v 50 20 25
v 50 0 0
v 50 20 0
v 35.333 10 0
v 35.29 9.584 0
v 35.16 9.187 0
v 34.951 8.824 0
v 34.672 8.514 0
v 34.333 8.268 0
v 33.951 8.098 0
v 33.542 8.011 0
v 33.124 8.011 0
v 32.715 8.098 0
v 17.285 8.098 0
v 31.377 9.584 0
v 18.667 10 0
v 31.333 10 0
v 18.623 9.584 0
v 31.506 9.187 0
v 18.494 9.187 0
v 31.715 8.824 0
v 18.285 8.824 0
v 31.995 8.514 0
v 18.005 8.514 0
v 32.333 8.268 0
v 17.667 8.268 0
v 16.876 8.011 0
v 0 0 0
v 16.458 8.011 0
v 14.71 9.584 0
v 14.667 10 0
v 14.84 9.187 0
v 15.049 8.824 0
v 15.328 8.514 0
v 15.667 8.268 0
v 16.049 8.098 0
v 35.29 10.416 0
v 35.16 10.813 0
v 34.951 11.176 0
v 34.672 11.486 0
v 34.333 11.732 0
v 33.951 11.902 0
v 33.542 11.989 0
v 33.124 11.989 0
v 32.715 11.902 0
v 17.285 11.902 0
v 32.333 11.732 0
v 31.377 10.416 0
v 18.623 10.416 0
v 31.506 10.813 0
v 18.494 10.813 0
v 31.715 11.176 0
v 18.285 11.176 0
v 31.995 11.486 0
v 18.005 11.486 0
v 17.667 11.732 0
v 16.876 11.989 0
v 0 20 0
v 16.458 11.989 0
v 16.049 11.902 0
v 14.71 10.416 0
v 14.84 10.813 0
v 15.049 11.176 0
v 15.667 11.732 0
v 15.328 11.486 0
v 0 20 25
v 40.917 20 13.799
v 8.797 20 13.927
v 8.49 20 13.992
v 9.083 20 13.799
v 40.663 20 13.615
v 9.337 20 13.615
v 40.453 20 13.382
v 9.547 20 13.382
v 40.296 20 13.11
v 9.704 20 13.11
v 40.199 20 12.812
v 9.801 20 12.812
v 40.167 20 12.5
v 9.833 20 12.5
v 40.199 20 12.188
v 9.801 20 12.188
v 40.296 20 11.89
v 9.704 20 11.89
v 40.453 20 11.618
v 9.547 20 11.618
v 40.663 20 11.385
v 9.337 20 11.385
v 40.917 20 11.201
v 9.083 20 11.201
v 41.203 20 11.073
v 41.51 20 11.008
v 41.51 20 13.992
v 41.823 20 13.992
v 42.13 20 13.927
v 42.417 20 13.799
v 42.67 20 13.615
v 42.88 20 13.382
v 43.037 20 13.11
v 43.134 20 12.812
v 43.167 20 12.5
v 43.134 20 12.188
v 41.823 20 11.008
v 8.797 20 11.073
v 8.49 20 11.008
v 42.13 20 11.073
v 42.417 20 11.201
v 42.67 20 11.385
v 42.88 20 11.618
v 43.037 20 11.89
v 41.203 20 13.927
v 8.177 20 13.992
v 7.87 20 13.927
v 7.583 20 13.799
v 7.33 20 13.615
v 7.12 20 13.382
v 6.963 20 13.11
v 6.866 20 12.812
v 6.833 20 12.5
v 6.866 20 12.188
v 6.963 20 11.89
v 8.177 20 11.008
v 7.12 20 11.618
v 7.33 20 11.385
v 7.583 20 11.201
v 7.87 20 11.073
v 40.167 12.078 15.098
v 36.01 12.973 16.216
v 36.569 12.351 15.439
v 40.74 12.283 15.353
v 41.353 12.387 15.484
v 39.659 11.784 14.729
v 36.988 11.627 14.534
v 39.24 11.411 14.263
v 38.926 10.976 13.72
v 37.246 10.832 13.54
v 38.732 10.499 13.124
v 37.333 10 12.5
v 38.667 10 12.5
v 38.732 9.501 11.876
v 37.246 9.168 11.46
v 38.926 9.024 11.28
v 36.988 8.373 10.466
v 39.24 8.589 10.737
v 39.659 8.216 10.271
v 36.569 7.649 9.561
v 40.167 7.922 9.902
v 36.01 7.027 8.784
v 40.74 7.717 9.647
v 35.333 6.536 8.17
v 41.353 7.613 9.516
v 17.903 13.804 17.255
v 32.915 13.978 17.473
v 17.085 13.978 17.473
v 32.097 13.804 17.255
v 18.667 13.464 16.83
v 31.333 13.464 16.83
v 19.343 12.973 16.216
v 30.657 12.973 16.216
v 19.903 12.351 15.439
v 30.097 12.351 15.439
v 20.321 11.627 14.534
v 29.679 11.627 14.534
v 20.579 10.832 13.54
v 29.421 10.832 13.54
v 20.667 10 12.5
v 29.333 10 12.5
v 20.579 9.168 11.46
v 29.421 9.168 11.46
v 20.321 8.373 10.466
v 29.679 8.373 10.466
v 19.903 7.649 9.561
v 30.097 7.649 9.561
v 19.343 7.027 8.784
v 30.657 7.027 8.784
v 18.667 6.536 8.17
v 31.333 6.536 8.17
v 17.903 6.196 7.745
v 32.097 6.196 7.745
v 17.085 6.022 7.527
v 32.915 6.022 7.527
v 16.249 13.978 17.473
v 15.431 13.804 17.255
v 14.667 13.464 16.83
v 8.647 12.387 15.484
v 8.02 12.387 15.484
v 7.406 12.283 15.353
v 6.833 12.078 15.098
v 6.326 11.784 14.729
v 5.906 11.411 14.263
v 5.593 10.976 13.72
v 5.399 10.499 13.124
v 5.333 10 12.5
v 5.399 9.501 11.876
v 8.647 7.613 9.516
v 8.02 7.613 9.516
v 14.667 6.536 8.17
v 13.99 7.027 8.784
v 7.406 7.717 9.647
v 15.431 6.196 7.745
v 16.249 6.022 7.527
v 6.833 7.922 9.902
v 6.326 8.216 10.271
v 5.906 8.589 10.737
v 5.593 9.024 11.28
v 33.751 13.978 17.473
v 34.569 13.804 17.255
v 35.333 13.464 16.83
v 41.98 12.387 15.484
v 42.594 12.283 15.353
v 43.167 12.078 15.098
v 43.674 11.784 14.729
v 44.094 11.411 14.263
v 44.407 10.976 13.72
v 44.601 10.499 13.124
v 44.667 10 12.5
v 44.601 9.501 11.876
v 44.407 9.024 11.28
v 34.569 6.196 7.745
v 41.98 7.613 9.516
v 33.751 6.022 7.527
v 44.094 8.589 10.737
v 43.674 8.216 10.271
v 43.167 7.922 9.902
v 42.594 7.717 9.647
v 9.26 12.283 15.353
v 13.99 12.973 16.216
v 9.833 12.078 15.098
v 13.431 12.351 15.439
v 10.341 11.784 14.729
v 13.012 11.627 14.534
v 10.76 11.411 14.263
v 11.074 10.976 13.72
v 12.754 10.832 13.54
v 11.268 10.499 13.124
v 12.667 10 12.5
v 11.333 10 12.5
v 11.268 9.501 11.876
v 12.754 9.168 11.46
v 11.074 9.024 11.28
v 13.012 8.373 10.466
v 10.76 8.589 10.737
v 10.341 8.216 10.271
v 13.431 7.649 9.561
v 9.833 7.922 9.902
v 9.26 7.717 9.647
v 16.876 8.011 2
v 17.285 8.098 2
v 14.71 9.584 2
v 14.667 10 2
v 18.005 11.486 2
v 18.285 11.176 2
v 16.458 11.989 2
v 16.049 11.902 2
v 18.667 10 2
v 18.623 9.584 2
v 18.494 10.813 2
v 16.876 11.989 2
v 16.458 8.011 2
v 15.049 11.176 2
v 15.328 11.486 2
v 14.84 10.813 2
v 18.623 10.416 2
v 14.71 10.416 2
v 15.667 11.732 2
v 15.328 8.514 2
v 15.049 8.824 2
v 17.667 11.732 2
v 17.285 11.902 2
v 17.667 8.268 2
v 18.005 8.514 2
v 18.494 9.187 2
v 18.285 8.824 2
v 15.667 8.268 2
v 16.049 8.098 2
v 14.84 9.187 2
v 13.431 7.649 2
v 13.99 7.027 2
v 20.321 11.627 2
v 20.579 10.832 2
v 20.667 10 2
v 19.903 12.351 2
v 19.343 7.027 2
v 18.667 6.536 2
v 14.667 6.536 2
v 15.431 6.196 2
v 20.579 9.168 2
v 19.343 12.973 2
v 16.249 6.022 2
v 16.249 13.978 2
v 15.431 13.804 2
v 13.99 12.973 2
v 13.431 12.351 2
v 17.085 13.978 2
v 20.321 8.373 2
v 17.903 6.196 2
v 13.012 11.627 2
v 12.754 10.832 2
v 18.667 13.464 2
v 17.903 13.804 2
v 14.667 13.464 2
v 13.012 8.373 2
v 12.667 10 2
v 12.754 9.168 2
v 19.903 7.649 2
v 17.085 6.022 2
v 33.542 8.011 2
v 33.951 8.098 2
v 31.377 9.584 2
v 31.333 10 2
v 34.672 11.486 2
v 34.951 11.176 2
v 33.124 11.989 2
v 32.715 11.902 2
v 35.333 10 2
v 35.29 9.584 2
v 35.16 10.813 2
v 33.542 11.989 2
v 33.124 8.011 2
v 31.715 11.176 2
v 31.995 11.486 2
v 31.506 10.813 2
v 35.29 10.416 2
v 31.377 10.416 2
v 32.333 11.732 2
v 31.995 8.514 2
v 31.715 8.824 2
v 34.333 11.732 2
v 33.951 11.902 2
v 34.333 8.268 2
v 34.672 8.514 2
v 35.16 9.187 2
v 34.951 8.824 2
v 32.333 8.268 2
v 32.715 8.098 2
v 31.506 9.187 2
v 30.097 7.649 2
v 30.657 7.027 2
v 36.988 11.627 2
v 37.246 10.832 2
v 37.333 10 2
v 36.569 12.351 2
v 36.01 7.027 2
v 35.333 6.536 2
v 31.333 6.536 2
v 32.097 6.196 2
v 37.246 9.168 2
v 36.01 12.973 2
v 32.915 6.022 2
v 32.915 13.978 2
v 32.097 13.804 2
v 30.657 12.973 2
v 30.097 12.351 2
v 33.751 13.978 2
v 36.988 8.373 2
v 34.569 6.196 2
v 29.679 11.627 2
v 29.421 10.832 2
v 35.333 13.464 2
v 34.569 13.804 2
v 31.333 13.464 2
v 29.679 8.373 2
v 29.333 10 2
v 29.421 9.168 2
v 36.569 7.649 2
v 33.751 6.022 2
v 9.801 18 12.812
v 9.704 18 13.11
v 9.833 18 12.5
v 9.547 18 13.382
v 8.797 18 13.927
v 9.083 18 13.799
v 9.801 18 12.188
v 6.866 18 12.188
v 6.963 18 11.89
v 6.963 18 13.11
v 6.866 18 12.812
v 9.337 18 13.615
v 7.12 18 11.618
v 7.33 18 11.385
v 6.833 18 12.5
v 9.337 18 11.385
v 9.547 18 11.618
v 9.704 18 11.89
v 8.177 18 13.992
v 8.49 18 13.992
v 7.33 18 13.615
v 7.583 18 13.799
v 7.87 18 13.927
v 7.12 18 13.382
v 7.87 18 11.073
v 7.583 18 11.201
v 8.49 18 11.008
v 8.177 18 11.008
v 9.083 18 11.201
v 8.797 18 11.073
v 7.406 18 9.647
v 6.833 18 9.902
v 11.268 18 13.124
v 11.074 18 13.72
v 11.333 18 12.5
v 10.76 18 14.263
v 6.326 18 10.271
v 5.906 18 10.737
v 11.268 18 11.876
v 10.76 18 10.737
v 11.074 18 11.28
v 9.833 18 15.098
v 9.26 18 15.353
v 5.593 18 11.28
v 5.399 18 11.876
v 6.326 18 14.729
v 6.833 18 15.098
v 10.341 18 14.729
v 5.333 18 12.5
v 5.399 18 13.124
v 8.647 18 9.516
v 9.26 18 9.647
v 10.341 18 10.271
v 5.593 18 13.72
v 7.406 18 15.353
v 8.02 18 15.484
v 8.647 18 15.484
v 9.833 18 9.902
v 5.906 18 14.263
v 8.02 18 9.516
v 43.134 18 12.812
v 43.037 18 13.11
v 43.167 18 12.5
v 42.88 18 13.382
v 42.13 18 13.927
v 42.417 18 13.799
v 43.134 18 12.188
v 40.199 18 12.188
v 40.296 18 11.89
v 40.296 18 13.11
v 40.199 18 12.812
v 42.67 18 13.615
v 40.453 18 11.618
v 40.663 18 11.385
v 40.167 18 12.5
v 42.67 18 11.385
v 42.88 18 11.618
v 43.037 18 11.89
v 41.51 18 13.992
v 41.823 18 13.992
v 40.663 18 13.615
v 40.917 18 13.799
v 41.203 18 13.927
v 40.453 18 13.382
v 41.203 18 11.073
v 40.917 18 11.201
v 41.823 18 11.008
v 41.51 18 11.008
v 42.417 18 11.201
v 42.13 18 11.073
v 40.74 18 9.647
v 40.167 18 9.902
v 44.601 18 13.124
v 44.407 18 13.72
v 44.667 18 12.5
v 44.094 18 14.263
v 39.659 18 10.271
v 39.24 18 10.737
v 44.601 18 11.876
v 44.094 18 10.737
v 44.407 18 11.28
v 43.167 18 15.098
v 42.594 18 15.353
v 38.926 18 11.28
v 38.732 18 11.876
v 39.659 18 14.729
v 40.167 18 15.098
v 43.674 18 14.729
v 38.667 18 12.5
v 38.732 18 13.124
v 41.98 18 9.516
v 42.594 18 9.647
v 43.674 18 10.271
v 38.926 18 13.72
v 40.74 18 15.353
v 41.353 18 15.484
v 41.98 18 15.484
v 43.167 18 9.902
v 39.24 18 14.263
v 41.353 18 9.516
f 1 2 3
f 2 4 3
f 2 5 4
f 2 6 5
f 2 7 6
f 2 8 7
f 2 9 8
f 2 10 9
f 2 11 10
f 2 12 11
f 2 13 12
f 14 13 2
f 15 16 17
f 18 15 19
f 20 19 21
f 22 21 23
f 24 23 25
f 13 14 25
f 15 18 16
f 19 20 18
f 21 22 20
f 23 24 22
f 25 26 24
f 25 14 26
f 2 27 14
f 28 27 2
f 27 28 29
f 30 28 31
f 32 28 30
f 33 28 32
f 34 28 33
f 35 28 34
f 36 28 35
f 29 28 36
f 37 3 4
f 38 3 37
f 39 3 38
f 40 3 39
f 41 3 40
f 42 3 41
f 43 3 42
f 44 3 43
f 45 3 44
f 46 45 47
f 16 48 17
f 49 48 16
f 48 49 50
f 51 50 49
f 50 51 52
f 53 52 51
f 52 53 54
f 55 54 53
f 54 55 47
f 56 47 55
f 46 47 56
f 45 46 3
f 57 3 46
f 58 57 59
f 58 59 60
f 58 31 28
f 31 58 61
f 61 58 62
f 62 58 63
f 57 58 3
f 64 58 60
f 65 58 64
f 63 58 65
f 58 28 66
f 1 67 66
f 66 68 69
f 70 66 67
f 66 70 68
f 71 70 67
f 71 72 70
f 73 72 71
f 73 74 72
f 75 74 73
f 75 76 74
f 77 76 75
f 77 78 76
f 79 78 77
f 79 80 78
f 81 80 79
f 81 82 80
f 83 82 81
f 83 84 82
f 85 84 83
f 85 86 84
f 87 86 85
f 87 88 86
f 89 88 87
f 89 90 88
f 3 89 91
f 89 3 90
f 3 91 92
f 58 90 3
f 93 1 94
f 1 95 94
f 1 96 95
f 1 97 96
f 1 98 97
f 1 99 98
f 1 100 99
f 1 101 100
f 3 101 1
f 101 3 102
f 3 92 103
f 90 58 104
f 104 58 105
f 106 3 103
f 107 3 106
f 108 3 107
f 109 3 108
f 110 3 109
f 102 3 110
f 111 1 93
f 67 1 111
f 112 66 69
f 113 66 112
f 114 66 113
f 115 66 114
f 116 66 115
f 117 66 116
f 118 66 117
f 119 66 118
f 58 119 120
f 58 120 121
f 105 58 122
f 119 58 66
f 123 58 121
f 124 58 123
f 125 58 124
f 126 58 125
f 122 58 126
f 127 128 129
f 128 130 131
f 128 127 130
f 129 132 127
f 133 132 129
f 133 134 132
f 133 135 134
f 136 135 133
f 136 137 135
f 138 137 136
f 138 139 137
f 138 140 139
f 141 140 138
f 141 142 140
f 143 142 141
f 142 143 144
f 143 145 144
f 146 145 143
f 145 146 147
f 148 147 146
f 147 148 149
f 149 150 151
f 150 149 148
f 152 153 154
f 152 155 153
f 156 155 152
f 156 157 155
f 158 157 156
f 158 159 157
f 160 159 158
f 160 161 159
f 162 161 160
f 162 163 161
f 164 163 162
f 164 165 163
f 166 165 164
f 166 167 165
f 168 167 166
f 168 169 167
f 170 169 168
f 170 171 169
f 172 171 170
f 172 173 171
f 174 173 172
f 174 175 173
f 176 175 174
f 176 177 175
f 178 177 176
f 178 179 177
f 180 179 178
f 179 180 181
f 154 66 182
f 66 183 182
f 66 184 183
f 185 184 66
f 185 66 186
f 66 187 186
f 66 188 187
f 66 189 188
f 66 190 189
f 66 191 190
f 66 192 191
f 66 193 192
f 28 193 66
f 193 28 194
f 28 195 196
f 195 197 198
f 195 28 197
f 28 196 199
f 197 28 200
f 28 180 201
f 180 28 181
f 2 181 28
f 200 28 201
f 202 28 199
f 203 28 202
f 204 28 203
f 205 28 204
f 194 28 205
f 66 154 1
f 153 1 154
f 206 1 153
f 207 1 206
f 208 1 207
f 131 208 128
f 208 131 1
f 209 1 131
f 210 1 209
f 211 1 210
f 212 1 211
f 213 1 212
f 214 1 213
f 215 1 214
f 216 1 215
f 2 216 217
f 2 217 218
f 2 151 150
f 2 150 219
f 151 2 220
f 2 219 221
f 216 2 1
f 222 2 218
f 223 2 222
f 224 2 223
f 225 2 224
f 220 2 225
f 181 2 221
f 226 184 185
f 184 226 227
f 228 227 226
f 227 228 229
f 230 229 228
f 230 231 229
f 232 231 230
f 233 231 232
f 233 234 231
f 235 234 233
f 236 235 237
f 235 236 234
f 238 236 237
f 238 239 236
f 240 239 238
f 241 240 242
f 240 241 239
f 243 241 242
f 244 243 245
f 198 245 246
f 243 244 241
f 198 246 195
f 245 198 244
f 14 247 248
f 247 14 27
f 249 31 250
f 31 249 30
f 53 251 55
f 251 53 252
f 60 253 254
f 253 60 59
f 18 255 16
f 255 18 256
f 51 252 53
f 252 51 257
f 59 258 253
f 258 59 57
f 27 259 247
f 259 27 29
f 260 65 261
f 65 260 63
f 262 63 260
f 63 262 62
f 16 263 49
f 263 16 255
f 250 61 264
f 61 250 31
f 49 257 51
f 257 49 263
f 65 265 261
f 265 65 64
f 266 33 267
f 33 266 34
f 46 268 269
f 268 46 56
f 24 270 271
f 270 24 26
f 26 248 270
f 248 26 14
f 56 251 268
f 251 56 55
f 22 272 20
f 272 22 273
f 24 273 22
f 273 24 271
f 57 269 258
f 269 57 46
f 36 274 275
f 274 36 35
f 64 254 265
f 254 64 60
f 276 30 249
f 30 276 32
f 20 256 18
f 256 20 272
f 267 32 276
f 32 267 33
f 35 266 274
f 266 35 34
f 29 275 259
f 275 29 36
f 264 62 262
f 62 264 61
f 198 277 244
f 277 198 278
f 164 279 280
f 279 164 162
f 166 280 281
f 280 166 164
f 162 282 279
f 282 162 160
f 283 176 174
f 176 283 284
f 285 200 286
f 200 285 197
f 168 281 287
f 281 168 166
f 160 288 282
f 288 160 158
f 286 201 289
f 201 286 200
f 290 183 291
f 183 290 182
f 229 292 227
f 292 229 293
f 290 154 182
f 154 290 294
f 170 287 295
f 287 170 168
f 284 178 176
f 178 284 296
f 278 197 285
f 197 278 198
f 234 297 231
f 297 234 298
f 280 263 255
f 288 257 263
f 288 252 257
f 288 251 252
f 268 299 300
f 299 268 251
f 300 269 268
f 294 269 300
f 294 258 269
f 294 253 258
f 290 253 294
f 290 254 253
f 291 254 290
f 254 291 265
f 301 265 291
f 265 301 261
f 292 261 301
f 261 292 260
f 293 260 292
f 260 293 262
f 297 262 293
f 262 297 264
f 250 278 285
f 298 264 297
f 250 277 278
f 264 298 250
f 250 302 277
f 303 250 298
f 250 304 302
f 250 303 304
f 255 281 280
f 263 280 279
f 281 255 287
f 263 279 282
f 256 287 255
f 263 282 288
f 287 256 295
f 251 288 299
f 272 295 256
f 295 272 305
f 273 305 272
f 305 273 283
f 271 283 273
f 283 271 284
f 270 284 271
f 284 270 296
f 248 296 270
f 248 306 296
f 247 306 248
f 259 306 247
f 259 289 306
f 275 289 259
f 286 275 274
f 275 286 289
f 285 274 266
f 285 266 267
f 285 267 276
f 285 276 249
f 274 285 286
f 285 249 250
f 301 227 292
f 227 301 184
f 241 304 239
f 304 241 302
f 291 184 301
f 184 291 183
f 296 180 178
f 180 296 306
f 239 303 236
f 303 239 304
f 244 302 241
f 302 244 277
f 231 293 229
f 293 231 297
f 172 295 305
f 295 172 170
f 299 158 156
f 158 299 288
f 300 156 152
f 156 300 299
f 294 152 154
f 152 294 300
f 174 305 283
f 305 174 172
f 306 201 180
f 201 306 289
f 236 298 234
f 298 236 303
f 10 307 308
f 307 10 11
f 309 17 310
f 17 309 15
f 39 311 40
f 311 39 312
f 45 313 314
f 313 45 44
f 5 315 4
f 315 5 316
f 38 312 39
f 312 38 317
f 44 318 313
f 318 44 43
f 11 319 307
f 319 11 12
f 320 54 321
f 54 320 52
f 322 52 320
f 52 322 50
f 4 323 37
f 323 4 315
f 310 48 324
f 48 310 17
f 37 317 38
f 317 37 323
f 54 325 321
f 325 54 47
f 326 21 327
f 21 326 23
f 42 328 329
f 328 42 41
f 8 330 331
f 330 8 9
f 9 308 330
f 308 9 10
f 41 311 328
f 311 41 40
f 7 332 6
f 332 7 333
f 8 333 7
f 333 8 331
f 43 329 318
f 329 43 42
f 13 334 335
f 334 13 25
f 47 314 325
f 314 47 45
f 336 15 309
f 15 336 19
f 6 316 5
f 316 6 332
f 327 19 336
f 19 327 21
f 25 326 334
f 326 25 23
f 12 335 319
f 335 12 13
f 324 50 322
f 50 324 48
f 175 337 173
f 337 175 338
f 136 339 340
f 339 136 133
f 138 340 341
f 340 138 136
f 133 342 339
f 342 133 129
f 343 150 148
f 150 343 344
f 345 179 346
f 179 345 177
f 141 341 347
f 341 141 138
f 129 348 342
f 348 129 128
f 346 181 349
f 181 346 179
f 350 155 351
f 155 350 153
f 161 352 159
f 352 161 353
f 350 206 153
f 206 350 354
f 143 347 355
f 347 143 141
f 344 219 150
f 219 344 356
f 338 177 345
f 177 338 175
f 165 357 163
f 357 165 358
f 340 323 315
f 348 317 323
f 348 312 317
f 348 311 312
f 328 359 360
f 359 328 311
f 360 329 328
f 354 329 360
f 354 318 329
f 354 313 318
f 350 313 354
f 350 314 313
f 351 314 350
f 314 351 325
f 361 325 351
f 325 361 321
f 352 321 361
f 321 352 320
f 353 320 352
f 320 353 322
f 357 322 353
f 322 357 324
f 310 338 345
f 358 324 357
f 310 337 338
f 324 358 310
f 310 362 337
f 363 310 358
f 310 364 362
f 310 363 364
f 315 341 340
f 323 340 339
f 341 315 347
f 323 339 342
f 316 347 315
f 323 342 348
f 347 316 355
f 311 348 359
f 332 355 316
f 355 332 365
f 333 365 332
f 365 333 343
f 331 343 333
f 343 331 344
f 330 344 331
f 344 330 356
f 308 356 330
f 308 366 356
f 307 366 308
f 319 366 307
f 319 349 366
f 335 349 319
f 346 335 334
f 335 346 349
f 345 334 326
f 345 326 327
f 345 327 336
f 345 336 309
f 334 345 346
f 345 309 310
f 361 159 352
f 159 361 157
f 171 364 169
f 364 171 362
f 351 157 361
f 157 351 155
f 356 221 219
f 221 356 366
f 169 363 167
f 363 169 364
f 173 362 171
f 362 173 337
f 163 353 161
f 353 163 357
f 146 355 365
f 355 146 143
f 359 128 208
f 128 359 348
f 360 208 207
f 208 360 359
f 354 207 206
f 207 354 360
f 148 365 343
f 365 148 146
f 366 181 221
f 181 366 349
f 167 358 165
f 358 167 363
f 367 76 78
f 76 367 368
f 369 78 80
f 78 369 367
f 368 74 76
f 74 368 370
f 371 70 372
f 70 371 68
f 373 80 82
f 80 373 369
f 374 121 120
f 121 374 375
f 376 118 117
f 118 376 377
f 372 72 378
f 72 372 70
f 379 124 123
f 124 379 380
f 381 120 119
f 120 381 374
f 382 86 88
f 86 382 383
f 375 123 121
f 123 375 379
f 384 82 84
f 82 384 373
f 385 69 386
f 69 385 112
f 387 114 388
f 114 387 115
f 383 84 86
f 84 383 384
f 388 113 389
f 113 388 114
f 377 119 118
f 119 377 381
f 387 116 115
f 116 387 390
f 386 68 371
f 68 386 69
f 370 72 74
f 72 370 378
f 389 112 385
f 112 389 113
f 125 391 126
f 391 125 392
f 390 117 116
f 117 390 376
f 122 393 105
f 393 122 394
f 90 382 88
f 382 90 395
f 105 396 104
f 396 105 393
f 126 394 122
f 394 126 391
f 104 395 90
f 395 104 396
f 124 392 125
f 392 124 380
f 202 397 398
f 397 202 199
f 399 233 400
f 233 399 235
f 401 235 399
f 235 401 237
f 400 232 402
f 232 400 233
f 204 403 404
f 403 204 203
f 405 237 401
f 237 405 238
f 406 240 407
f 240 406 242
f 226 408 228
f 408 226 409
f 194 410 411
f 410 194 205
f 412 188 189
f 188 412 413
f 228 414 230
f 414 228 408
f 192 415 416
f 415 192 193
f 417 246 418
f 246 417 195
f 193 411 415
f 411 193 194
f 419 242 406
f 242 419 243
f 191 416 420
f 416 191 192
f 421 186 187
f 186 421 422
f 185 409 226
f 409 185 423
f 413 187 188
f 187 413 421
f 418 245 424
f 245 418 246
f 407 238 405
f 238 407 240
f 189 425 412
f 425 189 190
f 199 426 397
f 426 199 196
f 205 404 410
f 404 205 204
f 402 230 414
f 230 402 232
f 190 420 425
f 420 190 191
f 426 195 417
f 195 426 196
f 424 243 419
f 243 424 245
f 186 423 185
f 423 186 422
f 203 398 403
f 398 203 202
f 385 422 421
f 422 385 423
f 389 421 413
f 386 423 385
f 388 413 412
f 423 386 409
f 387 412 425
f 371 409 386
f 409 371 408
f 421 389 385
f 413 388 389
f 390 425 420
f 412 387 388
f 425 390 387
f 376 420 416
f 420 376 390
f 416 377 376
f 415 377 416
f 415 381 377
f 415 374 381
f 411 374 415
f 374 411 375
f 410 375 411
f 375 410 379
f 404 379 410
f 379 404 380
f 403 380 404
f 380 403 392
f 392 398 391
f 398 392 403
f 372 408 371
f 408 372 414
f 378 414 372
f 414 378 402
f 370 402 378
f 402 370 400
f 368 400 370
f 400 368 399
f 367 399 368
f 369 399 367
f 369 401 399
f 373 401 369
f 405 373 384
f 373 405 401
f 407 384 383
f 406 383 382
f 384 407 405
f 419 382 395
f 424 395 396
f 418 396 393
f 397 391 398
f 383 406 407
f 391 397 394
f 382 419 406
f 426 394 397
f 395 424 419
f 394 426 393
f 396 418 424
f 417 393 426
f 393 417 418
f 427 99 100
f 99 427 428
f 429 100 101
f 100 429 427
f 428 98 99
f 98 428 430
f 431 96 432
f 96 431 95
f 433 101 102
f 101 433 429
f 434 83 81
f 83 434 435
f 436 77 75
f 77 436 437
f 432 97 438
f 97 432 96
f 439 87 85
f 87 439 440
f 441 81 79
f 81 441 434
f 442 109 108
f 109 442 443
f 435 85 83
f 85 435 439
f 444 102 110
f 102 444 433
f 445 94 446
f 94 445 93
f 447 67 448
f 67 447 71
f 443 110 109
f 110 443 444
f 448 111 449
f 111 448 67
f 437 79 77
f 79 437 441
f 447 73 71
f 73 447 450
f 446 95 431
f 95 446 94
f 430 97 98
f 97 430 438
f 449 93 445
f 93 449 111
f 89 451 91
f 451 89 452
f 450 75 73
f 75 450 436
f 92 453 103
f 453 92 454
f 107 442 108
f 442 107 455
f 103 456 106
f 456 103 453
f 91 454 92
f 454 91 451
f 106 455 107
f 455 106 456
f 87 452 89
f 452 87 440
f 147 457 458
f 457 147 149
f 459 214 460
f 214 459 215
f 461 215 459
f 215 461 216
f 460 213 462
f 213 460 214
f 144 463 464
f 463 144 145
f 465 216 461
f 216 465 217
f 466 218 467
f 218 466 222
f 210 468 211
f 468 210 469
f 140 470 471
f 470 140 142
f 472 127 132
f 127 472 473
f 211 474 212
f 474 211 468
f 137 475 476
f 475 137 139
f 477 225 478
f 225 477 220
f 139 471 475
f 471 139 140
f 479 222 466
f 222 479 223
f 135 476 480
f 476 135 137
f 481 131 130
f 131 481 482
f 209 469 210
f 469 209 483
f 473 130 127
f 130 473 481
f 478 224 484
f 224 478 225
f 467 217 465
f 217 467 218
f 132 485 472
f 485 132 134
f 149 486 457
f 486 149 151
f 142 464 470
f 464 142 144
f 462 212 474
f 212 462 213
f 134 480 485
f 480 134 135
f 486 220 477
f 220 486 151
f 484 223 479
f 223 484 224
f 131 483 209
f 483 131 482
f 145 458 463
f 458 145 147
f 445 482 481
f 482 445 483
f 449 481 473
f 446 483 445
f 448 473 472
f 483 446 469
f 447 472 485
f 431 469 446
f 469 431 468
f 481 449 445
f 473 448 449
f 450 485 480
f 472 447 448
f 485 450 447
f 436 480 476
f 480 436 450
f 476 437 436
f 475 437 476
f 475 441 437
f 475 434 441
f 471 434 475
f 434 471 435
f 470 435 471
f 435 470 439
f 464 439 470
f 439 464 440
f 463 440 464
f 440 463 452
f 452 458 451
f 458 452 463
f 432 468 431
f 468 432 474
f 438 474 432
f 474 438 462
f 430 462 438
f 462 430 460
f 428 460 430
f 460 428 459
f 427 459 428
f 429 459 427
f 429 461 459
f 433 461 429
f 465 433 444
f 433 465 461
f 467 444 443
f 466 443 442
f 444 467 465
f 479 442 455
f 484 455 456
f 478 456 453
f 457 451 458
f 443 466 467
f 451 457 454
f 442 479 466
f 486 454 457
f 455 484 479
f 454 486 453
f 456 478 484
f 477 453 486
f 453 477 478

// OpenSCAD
//Customizable square by Trinner. Downloaded from Thingiverse.
//Version 0.9

// Open this file with OpenScad software (free and open-source)
// http://www.openscad.org/downloads.html
// Choose your parameters in the SETTINGS section
// Press F5 to compile and see the resulting hook
// Check your square in the preview window
// If OK, press F6 to render
// Go to : File => Export => Export as STL : choose filename and location
// Save the STL file of your customized square

//SETTINGS

//Dimensions
w = 20;
l = 50;
h = 25;

//Screw Diameter spacing
Dw=8; //Head Diameter w side. 0 to remove screws
dw=4; //Thread diameter w side. 0 to remove screws
Dh=6; //Head Diameter h side. 0 to remove screws
dh=3; //Head Diameter h side. 0 to remove screws

//Thickness from screw head to thing end
a=2;

//Color
color("YELLOW")

//Perfil
difference() {

$fn=20;

difference(){cube ([l,w,h]);
rotate ([atan(h/w),0,0])
cube ([l,sqrt((h*h)+(w*w)),h]);
};

//Screws xy (width)
translate ([l*(1/3),w*0.5, 0])
tornillo(Dw,dw);
translate ([l*(2/3),w*0.5, 0])
tornillo(Dw,dw);
//Screws xz (heigth)
rotate ([90,0,0])
translate ([l*(1/6),h*0.5, -w])
tornillo(Dh, dh);
rotate ([90,0,0])
translate ([l*(5/6),h*0.5, -w])
tornillo(Dh, dh);
}

module tornillo (D,d){
//Rosca
cylinder (h=h,r1=d/2, r2=d/2, $fn=30);
//Cabeza
translate ([0,0,a])
cylinder (h=h,r1=D/2, r2=D/2, $fn=30);
}

//Warning messages

if (a<0.4)
    echo (" WARNING : Thickness under the screw head seems too low. Your printer may not probably be able to print this ");
